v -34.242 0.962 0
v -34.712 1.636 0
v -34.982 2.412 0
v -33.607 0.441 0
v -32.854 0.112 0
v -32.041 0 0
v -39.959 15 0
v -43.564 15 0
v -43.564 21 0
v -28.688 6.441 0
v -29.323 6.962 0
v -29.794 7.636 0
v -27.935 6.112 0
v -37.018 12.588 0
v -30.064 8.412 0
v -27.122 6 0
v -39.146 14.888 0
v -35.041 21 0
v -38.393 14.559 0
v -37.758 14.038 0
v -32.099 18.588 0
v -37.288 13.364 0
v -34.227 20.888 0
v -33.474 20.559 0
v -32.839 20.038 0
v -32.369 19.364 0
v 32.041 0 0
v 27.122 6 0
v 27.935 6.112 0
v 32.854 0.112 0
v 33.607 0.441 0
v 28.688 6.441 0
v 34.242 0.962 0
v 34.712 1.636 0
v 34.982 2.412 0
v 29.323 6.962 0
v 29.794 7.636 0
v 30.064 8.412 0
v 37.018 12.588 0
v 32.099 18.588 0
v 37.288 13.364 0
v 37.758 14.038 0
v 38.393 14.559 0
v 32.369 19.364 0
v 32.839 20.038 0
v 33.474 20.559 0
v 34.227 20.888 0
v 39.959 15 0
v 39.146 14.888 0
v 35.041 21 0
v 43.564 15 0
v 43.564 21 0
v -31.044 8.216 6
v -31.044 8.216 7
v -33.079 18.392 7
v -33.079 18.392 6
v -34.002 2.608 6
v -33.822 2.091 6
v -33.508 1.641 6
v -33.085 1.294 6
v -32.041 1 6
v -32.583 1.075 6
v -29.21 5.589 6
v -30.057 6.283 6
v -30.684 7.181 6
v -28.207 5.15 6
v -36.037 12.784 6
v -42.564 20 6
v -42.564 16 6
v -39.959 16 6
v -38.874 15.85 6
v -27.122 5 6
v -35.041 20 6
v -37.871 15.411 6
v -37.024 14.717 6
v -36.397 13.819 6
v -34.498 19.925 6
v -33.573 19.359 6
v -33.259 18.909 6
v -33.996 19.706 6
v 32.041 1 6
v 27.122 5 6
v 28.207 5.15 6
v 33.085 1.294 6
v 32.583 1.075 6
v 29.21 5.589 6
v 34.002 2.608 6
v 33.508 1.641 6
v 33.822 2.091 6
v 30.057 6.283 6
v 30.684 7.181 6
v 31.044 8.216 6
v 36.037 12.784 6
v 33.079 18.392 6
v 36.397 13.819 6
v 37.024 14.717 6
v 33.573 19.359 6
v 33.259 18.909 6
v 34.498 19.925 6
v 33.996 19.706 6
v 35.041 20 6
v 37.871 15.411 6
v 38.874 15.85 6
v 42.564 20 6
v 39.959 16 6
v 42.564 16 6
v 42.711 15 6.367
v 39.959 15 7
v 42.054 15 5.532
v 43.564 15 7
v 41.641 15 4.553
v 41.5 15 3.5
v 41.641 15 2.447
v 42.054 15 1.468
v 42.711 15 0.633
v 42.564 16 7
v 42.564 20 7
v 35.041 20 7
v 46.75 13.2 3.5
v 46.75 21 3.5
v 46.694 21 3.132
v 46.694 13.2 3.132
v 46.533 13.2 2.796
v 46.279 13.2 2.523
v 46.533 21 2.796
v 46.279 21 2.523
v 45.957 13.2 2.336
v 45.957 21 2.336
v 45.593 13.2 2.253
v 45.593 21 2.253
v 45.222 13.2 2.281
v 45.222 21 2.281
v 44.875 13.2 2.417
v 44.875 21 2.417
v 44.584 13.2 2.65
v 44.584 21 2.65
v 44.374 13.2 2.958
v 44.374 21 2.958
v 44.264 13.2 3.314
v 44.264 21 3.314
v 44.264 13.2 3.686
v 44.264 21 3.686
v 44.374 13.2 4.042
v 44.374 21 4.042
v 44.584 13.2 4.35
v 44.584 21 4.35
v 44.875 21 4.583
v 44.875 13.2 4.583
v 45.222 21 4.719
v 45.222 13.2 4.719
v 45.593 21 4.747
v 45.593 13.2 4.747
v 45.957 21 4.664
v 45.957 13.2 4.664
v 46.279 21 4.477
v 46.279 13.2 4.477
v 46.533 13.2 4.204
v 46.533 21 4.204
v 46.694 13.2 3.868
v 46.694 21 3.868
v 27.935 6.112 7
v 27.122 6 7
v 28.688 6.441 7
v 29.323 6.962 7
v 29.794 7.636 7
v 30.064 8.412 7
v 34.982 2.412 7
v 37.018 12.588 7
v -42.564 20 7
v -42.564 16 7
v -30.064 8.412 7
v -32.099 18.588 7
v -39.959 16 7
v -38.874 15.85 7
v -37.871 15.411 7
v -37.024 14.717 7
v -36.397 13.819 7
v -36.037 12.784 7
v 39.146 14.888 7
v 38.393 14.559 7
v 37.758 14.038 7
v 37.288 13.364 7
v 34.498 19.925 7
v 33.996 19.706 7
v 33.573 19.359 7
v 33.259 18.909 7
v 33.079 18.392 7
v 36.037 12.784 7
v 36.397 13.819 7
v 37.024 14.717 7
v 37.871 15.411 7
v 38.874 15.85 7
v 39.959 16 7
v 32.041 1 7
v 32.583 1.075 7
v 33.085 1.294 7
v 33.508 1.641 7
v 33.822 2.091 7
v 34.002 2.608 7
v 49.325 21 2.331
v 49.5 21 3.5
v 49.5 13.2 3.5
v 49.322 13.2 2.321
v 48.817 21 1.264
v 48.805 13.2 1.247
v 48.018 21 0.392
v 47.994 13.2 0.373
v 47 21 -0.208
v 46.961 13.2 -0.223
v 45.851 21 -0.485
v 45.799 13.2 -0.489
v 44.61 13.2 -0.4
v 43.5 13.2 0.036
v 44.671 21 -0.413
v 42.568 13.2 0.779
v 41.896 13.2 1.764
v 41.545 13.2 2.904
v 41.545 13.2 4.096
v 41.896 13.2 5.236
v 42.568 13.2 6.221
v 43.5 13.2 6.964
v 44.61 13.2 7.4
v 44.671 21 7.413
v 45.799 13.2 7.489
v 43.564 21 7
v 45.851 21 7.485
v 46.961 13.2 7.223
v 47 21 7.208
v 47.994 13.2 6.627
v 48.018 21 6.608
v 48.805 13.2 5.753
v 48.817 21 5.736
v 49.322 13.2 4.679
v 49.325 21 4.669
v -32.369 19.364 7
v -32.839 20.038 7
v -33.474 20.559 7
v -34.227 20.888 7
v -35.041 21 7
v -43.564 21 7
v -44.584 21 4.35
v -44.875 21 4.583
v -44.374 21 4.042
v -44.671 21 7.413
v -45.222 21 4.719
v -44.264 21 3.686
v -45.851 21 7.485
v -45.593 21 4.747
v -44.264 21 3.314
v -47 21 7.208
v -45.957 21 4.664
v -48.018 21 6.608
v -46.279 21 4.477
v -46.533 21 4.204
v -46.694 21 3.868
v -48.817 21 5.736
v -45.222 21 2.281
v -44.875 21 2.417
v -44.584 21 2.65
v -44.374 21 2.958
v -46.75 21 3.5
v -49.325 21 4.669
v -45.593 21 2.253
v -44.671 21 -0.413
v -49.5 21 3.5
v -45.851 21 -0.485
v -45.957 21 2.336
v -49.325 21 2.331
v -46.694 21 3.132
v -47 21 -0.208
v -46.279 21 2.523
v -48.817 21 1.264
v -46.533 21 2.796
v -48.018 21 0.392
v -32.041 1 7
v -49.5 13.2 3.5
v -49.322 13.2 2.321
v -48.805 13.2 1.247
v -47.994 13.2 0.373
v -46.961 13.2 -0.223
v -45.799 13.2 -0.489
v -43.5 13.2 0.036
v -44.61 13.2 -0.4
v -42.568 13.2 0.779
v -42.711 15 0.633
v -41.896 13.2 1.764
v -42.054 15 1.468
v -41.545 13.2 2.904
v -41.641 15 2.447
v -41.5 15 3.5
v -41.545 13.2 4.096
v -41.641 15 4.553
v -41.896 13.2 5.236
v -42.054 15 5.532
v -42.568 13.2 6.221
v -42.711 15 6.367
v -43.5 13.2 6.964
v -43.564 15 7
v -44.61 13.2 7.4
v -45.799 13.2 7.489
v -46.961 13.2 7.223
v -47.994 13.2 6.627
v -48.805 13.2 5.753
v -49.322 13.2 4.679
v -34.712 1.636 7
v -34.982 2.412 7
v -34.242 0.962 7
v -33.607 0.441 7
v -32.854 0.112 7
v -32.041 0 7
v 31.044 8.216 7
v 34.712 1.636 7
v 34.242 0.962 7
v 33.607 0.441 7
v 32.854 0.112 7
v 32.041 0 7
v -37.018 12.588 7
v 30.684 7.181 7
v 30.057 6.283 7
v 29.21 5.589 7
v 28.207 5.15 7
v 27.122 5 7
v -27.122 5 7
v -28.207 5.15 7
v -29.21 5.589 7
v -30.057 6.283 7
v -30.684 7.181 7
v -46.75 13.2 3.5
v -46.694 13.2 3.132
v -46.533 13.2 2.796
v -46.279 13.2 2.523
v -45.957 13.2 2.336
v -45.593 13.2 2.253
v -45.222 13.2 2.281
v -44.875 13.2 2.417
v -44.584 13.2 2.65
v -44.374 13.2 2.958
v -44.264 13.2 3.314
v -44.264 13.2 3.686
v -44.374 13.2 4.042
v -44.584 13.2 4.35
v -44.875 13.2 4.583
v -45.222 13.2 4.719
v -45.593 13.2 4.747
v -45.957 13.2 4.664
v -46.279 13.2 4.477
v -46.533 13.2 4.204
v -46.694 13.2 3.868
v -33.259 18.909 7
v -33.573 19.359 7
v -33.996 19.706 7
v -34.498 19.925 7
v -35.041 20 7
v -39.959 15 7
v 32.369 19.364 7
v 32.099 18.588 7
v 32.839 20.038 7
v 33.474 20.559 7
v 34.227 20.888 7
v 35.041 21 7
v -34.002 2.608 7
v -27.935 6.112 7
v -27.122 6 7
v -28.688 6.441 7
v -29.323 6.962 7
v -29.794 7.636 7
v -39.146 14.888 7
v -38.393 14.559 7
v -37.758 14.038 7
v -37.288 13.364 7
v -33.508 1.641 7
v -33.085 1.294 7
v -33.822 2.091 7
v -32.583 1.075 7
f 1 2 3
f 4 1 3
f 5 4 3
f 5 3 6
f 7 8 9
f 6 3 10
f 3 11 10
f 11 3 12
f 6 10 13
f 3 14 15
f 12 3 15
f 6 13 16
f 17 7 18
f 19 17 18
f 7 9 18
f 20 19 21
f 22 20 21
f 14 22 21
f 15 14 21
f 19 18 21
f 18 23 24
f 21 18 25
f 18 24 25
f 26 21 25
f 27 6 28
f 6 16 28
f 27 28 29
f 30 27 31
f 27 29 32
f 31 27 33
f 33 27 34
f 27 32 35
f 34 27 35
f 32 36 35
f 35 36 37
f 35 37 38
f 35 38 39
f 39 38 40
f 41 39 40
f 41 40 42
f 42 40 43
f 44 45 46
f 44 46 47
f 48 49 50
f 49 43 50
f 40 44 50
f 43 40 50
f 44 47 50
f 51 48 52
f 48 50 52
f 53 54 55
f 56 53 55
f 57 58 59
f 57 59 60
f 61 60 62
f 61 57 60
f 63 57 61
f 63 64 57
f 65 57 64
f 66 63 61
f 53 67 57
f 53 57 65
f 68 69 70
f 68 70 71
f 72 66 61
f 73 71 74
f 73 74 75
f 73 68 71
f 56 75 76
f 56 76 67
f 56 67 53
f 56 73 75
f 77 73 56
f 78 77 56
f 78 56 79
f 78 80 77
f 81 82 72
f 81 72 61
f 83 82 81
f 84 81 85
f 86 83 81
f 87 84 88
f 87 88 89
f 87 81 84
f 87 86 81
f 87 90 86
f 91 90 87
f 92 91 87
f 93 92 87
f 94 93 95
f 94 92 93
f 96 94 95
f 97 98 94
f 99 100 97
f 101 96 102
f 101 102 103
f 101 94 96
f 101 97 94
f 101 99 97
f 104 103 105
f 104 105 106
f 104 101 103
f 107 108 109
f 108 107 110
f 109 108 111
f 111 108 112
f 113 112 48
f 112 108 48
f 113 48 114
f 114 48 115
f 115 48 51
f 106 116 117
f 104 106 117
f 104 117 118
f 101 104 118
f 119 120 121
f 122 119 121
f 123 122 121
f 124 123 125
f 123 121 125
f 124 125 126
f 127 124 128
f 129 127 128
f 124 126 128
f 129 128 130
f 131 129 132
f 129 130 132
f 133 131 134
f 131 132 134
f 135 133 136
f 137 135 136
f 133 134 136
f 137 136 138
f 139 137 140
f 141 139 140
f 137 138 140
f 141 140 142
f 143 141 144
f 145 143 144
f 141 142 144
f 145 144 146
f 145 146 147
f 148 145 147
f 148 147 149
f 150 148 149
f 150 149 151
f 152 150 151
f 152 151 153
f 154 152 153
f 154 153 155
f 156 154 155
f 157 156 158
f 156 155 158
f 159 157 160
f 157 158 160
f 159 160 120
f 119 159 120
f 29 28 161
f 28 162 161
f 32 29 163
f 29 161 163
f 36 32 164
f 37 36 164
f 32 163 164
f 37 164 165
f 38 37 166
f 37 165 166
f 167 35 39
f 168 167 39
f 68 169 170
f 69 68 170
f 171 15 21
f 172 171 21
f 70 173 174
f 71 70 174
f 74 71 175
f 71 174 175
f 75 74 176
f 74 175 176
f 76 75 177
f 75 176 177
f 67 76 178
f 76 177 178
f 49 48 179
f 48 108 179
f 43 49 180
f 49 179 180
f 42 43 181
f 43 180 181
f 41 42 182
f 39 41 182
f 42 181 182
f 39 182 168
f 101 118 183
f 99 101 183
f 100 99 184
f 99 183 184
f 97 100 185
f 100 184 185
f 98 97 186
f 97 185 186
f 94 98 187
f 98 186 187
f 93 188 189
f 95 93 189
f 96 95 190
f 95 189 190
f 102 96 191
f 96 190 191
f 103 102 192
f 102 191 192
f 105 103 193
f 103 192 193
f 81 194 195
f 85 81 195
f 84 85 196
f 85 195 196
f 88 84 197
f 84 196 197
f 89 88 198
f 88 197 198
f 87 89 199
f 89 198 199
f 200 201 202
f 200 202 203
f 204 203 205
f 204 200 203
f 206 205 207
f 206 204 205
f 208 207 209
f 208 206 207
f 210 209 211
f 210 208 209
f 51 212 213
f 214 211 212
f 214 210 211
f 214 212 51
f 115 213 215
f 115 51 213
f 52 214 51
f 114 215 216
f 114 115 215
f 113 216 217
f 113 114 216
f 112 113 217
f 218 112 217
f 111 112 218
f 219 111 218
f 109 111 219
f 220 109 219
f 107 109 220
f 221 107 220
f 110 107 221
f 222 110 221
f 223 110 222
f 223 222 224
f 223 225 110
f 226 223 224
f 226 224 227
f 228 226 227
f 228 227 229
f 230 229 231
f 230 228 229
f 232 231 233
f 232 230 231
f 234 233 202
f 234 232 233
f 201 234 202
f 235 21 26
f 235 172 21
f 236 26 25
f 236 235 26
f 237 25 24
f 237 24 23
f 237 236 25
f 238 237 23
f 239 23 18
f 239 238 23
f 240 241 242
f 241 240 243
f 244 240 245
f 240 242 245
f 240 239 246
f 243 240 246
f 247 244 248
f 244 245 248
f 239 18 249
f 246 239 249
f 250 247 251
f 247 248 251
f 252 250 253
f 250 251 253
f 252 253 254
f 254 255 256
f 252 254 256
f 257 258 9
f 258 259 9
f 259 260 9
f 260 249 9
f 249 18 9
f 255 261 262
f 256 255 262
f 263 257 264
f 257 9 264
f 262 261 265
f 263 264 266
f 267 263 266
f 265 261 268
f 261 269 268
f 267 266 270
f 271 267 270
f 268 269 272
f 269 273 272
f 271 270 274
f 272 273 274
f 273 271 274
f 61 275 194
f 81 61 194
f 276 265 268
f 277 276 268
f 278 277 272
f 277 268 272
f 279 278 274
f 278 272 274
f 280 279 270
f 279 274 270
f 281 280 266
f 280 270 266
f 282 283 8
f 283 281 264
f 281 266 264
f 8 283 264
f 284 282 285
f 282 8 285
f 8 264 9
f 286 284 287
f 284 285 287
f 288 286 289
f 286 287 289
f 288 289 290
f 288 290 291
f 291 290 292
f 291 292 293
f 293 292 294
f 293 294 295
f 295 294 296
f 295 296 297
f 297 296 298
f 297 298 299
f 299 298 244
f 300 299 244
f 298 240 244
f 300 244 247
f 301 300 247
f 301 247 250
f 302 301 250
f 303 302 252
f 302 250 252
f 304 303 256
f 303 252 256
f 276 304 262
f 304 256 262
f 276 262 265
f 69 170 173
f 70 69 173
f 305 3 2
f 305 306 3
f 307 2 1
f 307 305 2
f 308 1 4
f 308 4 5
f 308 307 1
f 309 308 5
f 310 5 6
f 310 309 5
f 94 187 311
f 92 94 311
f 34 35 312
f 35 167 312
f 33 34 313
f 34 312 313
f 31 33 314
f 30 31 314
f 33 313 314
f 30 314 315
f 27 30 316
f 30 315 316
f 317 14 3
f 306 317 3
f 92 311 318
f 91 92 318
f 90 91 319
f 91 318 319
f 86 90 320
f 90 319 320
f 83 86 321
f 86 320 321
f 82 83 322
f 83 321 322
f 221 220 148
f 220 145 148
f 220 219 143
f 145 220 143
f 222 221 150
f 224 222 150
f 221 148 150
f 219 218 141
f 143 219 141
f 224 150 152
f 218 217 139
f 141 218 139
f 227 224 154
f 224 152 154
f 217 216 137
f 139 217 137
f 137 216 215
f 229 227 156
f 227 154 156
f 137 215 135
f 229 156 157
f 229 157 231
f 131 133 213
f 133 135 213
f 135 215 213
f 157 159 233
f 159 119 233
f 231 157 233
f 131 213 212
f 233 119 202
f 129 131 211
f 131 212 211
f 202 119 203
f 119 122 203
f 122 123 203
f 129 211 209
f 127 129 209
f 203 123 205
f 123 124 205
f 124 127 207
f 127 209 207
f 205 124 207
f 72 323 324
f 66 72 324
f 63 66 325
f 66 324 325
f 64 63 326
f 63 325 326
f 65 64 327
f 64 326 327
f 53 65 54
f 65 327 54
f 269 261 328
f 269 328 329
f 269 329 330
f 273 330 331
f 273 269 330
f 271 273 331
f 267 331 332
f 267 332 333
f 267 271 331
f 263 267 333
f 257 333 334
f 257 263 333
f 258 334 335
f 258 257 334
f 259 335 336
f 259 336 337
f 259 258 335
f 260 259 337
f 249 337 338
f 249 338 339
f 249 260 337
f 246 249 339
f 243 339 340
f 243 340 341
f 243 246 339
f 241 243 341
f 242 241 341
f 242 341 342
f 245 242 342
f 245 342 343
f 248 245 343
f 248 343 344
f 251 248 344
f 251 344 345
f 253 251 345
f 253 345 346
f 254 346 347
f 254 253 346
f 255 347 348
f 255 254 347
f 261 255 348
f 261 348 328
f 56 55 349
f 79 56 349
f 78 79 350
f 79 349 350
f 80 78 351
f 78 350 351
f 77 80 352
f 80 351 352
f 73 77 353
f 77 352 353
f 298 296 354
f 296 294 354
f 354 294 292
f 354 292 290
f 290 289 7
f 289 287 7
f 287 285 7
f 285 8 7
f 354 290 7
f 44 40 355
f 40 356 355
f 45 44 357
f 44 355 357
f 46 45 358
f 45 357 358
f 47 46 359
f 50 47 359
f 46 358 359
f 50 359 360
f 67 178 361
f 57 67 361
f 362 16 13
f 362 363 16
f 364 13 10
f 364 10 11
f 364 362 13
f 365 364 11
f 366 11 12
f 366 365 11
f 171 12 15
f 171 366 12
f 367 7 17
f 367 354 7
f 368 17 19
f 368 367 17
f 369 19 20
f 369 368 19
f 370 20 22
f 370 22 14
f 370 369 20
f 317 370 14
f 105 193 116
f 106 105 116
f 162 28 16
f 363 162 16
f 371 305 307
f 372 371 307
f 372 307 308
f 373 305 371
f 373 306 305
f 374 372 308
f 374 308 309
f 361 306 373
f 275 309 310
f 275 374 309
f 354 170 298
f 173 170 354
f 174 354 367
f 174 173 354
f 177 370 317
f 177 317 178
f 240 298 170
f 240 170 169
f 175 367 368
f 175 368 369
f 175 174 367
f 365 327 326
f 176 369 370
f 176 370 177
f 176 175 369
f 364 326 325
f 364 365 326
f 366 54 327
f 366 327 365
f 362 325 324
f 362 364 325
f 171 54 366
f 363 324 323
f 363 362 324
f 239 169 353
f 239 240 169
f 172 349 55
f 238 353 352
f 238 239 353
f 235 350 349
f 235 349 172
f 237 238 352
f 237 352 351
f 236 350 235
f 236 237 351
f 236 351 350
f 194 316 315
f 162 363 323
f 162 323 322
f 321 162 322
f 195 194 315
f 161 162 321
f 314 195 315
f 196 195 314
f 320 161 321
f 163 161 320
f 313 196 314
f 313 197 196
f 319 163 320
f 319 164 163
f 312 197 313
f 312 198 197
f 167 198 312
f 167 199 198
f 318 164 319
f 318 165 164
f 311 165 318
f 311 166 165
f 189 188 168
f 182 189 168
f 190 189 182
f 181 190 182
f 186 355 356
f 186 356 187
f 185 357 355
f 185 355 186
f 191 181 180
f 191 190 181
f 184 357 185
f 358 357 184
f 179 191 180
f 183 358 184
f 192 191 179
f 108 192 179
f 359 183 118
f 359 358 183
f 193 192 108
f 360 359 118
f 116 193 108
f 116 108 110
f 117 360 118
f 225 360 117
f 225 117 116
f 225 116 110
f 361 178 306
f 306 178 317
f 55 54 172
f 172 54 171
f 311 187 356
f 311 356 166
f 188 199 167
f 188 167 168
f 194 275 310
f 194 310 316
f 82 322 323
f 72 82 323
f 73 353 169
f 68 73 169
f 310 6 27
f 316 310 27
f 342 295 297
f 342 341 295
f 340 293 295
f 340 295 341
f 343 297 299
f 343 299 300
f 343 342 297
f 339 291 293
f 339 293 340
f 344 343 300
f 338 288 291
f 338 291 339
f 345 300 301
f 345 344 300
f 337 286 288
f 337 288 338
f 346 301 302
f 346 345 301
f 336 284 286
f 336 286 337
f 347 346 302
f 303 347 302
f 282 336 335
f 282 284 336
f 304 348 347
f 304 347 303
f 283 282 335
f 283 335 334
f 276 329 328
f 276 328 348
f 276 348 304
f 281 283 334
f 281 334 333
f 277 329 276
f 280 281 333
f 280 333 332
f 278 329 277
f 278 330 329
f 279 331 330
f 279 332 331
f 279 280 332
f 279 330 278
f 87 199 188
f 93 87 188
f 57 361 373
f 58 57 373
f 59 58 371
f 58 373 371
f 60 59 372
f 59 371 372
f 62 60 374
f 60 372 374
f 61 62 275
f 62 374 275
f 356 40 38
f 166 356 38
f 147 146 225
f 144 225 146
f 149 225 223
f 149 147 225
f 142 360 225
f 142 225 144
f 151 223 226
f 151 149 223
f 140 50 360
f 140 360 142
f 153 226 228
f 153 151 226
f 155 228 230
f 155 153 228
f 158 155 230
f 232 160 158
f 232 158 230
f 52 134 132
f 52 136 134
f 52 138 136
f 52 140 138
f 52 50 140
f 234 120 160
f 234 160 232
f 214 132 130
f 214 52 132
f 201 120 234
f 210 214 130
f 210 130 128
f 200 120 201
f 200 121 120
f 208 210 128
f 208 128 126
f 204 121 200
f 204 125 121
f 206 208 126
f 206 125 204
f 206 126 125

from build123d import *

# Parameters (mm, degrees)
BOSS_EXTRUDE2_DEPTH = 7
SKETCH2_R           = 4
BOSS_EXTRUDE3_DEPTH = 7.8
SKETCH3_R           = 1.25
CUT_EXTRUDE1_DEPTH  = 7.8
FILLET1_R           = 3
FILLET2_R           = 3
CUT_EXTRUDE2_DEPTH  = 1


with BuildPart() as part:
    # Sketch1 → Boss-Extrude2 (new body)
    with BuildSketch(Plane.XY):
        Polygon((-34.5, 0), (34.5, 0), (37.5, 15), (45.5, 15), (45.5, 21), (34.5, 21), (32.581176584, 21), (29.581176584, 6), (-29.581176584, 6), (-32.581176584, 21), (-45.5, 21), (-45.5, 15), (-37.5, 15), align=None)
    extrude(amount=BOSS_EXTRUDE2_DEPTH)

    # Sketch2 → Boss-Extrude3 (add)
    with BuildSketch(Plane(origin=(0, 21, 0), x_dir=(1, 0, 0), z_dir=(0, 1, 0))):
        with Locations((45.5, -3.5)):
            Circle(SKETCH2_R)
    boss_extrude3 = extrude(amount=-BOSS_EXTRUDE3_DEPTH)

    # Mirror1: Boss-Extrude3 across plane
    add(boss_extrude3.mirror(Plane(origin=(0, 0, 0), x_dir=(0, 0, 1), z_dir=(1, 0, 0))))

    # Sketch3 → Cut-Extrude1 (cut)
    with BuildSketch(Plane(origin=(0, 21, 0), x_dir=(1, 0, 0), z_dir=(0, 1, 0))):
        with Locations((45.5, -3.5)):
            Circle(SKETCH3_R)
    cut_extrude1 = extrude(amount=-CUT_EXTRUDE1_DEPTH, mode=Mode.SUBTRACT)

    # Mirror2: Cut-Extrude1 across plane
    add(cut_extrude1.mirror(Plane(origin=(0, 0, 0), x_dir=(0, 0, 1), z_dir=(1, 0, 0))), mode=Mode.SUBTRACT)

    # Fillet1
    fillet1_edges = [part.edges().sort_by_distance(p)[0] for p in [
        (34.5, 0, 3.5),
        (29.581176584, 6, 3.5),
    ]]
    fillet(fillet1_edges, radius=FILLET1_R)

    # Fillet2
    fillet2_edges = [part.edges().sort_by_distance(p)[0] for p in [
        (37.5, 15, 3.5),
        (-34.5, 0, 3.5),
        (-37.5, 15, 3.5),
        (-32.581176584, 21, 3.5),
        (-29.581176584, 6, 3.5),
        (32.581176584, 21, 3.5),
    ]]
    fillet(fillet2_edges, radius=FILLET2_R)

    # Sketch4 → Cut-Extrude2 (cut)
    with BuildSketch(Plane.XY.offset(7)):
        with BuildLine():
            Line((-36.037089005, 12.784464541), (-34.001749643, 2.60776773))
            ThreePointArc((-34.001749643, 2.60776773), (-33.308566103, 1.453315717), (-32.040588292, 1))
            Line((-32.040588292, 1), (32.040588292, 1))
            ThreePointArc((32.040588292, 1), (33.308566103, 1.453315717), (34.001749643, 2.60776773))
            Line((34.001749643, 2.60776773), (36.037089005, 12.784464541))
            ThreePointArc((36.037089005, 12.784464541), (37.423456086, 15.093368565), (39.959411708, 16))
            Line((39.959411708, 16), (42.563508327, 16))
            Line((42.563508327, 16), (42.563508327, 20))
            Line((42.563508327, 20), (35.040588292, 20))
            ThreePointArc((35.040588292, 20), (33.772610481, 19.546684283), (33.07942694, 18.39223227))
            Line((33.07942694, 18.39223227), (31.044087578, 8.215535459))
            ThreePointArc((31.044087578, 8.215535459), (29.657720498, 5.906631435), (27.121764876, 5))
            Line((27.121764876, 5), (-27.121764876, 5))
            ThreePointArc((-27.121764876, 5), (-29.657720498, 5.906631435), (-31.044087578, 8.215535459))
            Line((-31.044087578, 8.215535459), (-33.07942694, 18.39223227))
            ThreePointArc((-33.07942694, 18.39223227), (-33.772610481, 19.546684283), (-35.040588292, 20))
            Line((-35.040588292, 20), (-42.563508327, 20))
            Line((-42.563508327, 20), (-42.563508327, 16))
            Line((-42.563508327, 16), (-39.959411708, 16))
            ThreePointArc((-39.959411708, 16), (-37.423456086, 15.093368565), (-36.037089005, 12.784464541))
        make_face()
    extrude(amount=-CUT_EXTRUDE2_DEPTH, mode=Mode.SUBTRACT)


solid = part.part
